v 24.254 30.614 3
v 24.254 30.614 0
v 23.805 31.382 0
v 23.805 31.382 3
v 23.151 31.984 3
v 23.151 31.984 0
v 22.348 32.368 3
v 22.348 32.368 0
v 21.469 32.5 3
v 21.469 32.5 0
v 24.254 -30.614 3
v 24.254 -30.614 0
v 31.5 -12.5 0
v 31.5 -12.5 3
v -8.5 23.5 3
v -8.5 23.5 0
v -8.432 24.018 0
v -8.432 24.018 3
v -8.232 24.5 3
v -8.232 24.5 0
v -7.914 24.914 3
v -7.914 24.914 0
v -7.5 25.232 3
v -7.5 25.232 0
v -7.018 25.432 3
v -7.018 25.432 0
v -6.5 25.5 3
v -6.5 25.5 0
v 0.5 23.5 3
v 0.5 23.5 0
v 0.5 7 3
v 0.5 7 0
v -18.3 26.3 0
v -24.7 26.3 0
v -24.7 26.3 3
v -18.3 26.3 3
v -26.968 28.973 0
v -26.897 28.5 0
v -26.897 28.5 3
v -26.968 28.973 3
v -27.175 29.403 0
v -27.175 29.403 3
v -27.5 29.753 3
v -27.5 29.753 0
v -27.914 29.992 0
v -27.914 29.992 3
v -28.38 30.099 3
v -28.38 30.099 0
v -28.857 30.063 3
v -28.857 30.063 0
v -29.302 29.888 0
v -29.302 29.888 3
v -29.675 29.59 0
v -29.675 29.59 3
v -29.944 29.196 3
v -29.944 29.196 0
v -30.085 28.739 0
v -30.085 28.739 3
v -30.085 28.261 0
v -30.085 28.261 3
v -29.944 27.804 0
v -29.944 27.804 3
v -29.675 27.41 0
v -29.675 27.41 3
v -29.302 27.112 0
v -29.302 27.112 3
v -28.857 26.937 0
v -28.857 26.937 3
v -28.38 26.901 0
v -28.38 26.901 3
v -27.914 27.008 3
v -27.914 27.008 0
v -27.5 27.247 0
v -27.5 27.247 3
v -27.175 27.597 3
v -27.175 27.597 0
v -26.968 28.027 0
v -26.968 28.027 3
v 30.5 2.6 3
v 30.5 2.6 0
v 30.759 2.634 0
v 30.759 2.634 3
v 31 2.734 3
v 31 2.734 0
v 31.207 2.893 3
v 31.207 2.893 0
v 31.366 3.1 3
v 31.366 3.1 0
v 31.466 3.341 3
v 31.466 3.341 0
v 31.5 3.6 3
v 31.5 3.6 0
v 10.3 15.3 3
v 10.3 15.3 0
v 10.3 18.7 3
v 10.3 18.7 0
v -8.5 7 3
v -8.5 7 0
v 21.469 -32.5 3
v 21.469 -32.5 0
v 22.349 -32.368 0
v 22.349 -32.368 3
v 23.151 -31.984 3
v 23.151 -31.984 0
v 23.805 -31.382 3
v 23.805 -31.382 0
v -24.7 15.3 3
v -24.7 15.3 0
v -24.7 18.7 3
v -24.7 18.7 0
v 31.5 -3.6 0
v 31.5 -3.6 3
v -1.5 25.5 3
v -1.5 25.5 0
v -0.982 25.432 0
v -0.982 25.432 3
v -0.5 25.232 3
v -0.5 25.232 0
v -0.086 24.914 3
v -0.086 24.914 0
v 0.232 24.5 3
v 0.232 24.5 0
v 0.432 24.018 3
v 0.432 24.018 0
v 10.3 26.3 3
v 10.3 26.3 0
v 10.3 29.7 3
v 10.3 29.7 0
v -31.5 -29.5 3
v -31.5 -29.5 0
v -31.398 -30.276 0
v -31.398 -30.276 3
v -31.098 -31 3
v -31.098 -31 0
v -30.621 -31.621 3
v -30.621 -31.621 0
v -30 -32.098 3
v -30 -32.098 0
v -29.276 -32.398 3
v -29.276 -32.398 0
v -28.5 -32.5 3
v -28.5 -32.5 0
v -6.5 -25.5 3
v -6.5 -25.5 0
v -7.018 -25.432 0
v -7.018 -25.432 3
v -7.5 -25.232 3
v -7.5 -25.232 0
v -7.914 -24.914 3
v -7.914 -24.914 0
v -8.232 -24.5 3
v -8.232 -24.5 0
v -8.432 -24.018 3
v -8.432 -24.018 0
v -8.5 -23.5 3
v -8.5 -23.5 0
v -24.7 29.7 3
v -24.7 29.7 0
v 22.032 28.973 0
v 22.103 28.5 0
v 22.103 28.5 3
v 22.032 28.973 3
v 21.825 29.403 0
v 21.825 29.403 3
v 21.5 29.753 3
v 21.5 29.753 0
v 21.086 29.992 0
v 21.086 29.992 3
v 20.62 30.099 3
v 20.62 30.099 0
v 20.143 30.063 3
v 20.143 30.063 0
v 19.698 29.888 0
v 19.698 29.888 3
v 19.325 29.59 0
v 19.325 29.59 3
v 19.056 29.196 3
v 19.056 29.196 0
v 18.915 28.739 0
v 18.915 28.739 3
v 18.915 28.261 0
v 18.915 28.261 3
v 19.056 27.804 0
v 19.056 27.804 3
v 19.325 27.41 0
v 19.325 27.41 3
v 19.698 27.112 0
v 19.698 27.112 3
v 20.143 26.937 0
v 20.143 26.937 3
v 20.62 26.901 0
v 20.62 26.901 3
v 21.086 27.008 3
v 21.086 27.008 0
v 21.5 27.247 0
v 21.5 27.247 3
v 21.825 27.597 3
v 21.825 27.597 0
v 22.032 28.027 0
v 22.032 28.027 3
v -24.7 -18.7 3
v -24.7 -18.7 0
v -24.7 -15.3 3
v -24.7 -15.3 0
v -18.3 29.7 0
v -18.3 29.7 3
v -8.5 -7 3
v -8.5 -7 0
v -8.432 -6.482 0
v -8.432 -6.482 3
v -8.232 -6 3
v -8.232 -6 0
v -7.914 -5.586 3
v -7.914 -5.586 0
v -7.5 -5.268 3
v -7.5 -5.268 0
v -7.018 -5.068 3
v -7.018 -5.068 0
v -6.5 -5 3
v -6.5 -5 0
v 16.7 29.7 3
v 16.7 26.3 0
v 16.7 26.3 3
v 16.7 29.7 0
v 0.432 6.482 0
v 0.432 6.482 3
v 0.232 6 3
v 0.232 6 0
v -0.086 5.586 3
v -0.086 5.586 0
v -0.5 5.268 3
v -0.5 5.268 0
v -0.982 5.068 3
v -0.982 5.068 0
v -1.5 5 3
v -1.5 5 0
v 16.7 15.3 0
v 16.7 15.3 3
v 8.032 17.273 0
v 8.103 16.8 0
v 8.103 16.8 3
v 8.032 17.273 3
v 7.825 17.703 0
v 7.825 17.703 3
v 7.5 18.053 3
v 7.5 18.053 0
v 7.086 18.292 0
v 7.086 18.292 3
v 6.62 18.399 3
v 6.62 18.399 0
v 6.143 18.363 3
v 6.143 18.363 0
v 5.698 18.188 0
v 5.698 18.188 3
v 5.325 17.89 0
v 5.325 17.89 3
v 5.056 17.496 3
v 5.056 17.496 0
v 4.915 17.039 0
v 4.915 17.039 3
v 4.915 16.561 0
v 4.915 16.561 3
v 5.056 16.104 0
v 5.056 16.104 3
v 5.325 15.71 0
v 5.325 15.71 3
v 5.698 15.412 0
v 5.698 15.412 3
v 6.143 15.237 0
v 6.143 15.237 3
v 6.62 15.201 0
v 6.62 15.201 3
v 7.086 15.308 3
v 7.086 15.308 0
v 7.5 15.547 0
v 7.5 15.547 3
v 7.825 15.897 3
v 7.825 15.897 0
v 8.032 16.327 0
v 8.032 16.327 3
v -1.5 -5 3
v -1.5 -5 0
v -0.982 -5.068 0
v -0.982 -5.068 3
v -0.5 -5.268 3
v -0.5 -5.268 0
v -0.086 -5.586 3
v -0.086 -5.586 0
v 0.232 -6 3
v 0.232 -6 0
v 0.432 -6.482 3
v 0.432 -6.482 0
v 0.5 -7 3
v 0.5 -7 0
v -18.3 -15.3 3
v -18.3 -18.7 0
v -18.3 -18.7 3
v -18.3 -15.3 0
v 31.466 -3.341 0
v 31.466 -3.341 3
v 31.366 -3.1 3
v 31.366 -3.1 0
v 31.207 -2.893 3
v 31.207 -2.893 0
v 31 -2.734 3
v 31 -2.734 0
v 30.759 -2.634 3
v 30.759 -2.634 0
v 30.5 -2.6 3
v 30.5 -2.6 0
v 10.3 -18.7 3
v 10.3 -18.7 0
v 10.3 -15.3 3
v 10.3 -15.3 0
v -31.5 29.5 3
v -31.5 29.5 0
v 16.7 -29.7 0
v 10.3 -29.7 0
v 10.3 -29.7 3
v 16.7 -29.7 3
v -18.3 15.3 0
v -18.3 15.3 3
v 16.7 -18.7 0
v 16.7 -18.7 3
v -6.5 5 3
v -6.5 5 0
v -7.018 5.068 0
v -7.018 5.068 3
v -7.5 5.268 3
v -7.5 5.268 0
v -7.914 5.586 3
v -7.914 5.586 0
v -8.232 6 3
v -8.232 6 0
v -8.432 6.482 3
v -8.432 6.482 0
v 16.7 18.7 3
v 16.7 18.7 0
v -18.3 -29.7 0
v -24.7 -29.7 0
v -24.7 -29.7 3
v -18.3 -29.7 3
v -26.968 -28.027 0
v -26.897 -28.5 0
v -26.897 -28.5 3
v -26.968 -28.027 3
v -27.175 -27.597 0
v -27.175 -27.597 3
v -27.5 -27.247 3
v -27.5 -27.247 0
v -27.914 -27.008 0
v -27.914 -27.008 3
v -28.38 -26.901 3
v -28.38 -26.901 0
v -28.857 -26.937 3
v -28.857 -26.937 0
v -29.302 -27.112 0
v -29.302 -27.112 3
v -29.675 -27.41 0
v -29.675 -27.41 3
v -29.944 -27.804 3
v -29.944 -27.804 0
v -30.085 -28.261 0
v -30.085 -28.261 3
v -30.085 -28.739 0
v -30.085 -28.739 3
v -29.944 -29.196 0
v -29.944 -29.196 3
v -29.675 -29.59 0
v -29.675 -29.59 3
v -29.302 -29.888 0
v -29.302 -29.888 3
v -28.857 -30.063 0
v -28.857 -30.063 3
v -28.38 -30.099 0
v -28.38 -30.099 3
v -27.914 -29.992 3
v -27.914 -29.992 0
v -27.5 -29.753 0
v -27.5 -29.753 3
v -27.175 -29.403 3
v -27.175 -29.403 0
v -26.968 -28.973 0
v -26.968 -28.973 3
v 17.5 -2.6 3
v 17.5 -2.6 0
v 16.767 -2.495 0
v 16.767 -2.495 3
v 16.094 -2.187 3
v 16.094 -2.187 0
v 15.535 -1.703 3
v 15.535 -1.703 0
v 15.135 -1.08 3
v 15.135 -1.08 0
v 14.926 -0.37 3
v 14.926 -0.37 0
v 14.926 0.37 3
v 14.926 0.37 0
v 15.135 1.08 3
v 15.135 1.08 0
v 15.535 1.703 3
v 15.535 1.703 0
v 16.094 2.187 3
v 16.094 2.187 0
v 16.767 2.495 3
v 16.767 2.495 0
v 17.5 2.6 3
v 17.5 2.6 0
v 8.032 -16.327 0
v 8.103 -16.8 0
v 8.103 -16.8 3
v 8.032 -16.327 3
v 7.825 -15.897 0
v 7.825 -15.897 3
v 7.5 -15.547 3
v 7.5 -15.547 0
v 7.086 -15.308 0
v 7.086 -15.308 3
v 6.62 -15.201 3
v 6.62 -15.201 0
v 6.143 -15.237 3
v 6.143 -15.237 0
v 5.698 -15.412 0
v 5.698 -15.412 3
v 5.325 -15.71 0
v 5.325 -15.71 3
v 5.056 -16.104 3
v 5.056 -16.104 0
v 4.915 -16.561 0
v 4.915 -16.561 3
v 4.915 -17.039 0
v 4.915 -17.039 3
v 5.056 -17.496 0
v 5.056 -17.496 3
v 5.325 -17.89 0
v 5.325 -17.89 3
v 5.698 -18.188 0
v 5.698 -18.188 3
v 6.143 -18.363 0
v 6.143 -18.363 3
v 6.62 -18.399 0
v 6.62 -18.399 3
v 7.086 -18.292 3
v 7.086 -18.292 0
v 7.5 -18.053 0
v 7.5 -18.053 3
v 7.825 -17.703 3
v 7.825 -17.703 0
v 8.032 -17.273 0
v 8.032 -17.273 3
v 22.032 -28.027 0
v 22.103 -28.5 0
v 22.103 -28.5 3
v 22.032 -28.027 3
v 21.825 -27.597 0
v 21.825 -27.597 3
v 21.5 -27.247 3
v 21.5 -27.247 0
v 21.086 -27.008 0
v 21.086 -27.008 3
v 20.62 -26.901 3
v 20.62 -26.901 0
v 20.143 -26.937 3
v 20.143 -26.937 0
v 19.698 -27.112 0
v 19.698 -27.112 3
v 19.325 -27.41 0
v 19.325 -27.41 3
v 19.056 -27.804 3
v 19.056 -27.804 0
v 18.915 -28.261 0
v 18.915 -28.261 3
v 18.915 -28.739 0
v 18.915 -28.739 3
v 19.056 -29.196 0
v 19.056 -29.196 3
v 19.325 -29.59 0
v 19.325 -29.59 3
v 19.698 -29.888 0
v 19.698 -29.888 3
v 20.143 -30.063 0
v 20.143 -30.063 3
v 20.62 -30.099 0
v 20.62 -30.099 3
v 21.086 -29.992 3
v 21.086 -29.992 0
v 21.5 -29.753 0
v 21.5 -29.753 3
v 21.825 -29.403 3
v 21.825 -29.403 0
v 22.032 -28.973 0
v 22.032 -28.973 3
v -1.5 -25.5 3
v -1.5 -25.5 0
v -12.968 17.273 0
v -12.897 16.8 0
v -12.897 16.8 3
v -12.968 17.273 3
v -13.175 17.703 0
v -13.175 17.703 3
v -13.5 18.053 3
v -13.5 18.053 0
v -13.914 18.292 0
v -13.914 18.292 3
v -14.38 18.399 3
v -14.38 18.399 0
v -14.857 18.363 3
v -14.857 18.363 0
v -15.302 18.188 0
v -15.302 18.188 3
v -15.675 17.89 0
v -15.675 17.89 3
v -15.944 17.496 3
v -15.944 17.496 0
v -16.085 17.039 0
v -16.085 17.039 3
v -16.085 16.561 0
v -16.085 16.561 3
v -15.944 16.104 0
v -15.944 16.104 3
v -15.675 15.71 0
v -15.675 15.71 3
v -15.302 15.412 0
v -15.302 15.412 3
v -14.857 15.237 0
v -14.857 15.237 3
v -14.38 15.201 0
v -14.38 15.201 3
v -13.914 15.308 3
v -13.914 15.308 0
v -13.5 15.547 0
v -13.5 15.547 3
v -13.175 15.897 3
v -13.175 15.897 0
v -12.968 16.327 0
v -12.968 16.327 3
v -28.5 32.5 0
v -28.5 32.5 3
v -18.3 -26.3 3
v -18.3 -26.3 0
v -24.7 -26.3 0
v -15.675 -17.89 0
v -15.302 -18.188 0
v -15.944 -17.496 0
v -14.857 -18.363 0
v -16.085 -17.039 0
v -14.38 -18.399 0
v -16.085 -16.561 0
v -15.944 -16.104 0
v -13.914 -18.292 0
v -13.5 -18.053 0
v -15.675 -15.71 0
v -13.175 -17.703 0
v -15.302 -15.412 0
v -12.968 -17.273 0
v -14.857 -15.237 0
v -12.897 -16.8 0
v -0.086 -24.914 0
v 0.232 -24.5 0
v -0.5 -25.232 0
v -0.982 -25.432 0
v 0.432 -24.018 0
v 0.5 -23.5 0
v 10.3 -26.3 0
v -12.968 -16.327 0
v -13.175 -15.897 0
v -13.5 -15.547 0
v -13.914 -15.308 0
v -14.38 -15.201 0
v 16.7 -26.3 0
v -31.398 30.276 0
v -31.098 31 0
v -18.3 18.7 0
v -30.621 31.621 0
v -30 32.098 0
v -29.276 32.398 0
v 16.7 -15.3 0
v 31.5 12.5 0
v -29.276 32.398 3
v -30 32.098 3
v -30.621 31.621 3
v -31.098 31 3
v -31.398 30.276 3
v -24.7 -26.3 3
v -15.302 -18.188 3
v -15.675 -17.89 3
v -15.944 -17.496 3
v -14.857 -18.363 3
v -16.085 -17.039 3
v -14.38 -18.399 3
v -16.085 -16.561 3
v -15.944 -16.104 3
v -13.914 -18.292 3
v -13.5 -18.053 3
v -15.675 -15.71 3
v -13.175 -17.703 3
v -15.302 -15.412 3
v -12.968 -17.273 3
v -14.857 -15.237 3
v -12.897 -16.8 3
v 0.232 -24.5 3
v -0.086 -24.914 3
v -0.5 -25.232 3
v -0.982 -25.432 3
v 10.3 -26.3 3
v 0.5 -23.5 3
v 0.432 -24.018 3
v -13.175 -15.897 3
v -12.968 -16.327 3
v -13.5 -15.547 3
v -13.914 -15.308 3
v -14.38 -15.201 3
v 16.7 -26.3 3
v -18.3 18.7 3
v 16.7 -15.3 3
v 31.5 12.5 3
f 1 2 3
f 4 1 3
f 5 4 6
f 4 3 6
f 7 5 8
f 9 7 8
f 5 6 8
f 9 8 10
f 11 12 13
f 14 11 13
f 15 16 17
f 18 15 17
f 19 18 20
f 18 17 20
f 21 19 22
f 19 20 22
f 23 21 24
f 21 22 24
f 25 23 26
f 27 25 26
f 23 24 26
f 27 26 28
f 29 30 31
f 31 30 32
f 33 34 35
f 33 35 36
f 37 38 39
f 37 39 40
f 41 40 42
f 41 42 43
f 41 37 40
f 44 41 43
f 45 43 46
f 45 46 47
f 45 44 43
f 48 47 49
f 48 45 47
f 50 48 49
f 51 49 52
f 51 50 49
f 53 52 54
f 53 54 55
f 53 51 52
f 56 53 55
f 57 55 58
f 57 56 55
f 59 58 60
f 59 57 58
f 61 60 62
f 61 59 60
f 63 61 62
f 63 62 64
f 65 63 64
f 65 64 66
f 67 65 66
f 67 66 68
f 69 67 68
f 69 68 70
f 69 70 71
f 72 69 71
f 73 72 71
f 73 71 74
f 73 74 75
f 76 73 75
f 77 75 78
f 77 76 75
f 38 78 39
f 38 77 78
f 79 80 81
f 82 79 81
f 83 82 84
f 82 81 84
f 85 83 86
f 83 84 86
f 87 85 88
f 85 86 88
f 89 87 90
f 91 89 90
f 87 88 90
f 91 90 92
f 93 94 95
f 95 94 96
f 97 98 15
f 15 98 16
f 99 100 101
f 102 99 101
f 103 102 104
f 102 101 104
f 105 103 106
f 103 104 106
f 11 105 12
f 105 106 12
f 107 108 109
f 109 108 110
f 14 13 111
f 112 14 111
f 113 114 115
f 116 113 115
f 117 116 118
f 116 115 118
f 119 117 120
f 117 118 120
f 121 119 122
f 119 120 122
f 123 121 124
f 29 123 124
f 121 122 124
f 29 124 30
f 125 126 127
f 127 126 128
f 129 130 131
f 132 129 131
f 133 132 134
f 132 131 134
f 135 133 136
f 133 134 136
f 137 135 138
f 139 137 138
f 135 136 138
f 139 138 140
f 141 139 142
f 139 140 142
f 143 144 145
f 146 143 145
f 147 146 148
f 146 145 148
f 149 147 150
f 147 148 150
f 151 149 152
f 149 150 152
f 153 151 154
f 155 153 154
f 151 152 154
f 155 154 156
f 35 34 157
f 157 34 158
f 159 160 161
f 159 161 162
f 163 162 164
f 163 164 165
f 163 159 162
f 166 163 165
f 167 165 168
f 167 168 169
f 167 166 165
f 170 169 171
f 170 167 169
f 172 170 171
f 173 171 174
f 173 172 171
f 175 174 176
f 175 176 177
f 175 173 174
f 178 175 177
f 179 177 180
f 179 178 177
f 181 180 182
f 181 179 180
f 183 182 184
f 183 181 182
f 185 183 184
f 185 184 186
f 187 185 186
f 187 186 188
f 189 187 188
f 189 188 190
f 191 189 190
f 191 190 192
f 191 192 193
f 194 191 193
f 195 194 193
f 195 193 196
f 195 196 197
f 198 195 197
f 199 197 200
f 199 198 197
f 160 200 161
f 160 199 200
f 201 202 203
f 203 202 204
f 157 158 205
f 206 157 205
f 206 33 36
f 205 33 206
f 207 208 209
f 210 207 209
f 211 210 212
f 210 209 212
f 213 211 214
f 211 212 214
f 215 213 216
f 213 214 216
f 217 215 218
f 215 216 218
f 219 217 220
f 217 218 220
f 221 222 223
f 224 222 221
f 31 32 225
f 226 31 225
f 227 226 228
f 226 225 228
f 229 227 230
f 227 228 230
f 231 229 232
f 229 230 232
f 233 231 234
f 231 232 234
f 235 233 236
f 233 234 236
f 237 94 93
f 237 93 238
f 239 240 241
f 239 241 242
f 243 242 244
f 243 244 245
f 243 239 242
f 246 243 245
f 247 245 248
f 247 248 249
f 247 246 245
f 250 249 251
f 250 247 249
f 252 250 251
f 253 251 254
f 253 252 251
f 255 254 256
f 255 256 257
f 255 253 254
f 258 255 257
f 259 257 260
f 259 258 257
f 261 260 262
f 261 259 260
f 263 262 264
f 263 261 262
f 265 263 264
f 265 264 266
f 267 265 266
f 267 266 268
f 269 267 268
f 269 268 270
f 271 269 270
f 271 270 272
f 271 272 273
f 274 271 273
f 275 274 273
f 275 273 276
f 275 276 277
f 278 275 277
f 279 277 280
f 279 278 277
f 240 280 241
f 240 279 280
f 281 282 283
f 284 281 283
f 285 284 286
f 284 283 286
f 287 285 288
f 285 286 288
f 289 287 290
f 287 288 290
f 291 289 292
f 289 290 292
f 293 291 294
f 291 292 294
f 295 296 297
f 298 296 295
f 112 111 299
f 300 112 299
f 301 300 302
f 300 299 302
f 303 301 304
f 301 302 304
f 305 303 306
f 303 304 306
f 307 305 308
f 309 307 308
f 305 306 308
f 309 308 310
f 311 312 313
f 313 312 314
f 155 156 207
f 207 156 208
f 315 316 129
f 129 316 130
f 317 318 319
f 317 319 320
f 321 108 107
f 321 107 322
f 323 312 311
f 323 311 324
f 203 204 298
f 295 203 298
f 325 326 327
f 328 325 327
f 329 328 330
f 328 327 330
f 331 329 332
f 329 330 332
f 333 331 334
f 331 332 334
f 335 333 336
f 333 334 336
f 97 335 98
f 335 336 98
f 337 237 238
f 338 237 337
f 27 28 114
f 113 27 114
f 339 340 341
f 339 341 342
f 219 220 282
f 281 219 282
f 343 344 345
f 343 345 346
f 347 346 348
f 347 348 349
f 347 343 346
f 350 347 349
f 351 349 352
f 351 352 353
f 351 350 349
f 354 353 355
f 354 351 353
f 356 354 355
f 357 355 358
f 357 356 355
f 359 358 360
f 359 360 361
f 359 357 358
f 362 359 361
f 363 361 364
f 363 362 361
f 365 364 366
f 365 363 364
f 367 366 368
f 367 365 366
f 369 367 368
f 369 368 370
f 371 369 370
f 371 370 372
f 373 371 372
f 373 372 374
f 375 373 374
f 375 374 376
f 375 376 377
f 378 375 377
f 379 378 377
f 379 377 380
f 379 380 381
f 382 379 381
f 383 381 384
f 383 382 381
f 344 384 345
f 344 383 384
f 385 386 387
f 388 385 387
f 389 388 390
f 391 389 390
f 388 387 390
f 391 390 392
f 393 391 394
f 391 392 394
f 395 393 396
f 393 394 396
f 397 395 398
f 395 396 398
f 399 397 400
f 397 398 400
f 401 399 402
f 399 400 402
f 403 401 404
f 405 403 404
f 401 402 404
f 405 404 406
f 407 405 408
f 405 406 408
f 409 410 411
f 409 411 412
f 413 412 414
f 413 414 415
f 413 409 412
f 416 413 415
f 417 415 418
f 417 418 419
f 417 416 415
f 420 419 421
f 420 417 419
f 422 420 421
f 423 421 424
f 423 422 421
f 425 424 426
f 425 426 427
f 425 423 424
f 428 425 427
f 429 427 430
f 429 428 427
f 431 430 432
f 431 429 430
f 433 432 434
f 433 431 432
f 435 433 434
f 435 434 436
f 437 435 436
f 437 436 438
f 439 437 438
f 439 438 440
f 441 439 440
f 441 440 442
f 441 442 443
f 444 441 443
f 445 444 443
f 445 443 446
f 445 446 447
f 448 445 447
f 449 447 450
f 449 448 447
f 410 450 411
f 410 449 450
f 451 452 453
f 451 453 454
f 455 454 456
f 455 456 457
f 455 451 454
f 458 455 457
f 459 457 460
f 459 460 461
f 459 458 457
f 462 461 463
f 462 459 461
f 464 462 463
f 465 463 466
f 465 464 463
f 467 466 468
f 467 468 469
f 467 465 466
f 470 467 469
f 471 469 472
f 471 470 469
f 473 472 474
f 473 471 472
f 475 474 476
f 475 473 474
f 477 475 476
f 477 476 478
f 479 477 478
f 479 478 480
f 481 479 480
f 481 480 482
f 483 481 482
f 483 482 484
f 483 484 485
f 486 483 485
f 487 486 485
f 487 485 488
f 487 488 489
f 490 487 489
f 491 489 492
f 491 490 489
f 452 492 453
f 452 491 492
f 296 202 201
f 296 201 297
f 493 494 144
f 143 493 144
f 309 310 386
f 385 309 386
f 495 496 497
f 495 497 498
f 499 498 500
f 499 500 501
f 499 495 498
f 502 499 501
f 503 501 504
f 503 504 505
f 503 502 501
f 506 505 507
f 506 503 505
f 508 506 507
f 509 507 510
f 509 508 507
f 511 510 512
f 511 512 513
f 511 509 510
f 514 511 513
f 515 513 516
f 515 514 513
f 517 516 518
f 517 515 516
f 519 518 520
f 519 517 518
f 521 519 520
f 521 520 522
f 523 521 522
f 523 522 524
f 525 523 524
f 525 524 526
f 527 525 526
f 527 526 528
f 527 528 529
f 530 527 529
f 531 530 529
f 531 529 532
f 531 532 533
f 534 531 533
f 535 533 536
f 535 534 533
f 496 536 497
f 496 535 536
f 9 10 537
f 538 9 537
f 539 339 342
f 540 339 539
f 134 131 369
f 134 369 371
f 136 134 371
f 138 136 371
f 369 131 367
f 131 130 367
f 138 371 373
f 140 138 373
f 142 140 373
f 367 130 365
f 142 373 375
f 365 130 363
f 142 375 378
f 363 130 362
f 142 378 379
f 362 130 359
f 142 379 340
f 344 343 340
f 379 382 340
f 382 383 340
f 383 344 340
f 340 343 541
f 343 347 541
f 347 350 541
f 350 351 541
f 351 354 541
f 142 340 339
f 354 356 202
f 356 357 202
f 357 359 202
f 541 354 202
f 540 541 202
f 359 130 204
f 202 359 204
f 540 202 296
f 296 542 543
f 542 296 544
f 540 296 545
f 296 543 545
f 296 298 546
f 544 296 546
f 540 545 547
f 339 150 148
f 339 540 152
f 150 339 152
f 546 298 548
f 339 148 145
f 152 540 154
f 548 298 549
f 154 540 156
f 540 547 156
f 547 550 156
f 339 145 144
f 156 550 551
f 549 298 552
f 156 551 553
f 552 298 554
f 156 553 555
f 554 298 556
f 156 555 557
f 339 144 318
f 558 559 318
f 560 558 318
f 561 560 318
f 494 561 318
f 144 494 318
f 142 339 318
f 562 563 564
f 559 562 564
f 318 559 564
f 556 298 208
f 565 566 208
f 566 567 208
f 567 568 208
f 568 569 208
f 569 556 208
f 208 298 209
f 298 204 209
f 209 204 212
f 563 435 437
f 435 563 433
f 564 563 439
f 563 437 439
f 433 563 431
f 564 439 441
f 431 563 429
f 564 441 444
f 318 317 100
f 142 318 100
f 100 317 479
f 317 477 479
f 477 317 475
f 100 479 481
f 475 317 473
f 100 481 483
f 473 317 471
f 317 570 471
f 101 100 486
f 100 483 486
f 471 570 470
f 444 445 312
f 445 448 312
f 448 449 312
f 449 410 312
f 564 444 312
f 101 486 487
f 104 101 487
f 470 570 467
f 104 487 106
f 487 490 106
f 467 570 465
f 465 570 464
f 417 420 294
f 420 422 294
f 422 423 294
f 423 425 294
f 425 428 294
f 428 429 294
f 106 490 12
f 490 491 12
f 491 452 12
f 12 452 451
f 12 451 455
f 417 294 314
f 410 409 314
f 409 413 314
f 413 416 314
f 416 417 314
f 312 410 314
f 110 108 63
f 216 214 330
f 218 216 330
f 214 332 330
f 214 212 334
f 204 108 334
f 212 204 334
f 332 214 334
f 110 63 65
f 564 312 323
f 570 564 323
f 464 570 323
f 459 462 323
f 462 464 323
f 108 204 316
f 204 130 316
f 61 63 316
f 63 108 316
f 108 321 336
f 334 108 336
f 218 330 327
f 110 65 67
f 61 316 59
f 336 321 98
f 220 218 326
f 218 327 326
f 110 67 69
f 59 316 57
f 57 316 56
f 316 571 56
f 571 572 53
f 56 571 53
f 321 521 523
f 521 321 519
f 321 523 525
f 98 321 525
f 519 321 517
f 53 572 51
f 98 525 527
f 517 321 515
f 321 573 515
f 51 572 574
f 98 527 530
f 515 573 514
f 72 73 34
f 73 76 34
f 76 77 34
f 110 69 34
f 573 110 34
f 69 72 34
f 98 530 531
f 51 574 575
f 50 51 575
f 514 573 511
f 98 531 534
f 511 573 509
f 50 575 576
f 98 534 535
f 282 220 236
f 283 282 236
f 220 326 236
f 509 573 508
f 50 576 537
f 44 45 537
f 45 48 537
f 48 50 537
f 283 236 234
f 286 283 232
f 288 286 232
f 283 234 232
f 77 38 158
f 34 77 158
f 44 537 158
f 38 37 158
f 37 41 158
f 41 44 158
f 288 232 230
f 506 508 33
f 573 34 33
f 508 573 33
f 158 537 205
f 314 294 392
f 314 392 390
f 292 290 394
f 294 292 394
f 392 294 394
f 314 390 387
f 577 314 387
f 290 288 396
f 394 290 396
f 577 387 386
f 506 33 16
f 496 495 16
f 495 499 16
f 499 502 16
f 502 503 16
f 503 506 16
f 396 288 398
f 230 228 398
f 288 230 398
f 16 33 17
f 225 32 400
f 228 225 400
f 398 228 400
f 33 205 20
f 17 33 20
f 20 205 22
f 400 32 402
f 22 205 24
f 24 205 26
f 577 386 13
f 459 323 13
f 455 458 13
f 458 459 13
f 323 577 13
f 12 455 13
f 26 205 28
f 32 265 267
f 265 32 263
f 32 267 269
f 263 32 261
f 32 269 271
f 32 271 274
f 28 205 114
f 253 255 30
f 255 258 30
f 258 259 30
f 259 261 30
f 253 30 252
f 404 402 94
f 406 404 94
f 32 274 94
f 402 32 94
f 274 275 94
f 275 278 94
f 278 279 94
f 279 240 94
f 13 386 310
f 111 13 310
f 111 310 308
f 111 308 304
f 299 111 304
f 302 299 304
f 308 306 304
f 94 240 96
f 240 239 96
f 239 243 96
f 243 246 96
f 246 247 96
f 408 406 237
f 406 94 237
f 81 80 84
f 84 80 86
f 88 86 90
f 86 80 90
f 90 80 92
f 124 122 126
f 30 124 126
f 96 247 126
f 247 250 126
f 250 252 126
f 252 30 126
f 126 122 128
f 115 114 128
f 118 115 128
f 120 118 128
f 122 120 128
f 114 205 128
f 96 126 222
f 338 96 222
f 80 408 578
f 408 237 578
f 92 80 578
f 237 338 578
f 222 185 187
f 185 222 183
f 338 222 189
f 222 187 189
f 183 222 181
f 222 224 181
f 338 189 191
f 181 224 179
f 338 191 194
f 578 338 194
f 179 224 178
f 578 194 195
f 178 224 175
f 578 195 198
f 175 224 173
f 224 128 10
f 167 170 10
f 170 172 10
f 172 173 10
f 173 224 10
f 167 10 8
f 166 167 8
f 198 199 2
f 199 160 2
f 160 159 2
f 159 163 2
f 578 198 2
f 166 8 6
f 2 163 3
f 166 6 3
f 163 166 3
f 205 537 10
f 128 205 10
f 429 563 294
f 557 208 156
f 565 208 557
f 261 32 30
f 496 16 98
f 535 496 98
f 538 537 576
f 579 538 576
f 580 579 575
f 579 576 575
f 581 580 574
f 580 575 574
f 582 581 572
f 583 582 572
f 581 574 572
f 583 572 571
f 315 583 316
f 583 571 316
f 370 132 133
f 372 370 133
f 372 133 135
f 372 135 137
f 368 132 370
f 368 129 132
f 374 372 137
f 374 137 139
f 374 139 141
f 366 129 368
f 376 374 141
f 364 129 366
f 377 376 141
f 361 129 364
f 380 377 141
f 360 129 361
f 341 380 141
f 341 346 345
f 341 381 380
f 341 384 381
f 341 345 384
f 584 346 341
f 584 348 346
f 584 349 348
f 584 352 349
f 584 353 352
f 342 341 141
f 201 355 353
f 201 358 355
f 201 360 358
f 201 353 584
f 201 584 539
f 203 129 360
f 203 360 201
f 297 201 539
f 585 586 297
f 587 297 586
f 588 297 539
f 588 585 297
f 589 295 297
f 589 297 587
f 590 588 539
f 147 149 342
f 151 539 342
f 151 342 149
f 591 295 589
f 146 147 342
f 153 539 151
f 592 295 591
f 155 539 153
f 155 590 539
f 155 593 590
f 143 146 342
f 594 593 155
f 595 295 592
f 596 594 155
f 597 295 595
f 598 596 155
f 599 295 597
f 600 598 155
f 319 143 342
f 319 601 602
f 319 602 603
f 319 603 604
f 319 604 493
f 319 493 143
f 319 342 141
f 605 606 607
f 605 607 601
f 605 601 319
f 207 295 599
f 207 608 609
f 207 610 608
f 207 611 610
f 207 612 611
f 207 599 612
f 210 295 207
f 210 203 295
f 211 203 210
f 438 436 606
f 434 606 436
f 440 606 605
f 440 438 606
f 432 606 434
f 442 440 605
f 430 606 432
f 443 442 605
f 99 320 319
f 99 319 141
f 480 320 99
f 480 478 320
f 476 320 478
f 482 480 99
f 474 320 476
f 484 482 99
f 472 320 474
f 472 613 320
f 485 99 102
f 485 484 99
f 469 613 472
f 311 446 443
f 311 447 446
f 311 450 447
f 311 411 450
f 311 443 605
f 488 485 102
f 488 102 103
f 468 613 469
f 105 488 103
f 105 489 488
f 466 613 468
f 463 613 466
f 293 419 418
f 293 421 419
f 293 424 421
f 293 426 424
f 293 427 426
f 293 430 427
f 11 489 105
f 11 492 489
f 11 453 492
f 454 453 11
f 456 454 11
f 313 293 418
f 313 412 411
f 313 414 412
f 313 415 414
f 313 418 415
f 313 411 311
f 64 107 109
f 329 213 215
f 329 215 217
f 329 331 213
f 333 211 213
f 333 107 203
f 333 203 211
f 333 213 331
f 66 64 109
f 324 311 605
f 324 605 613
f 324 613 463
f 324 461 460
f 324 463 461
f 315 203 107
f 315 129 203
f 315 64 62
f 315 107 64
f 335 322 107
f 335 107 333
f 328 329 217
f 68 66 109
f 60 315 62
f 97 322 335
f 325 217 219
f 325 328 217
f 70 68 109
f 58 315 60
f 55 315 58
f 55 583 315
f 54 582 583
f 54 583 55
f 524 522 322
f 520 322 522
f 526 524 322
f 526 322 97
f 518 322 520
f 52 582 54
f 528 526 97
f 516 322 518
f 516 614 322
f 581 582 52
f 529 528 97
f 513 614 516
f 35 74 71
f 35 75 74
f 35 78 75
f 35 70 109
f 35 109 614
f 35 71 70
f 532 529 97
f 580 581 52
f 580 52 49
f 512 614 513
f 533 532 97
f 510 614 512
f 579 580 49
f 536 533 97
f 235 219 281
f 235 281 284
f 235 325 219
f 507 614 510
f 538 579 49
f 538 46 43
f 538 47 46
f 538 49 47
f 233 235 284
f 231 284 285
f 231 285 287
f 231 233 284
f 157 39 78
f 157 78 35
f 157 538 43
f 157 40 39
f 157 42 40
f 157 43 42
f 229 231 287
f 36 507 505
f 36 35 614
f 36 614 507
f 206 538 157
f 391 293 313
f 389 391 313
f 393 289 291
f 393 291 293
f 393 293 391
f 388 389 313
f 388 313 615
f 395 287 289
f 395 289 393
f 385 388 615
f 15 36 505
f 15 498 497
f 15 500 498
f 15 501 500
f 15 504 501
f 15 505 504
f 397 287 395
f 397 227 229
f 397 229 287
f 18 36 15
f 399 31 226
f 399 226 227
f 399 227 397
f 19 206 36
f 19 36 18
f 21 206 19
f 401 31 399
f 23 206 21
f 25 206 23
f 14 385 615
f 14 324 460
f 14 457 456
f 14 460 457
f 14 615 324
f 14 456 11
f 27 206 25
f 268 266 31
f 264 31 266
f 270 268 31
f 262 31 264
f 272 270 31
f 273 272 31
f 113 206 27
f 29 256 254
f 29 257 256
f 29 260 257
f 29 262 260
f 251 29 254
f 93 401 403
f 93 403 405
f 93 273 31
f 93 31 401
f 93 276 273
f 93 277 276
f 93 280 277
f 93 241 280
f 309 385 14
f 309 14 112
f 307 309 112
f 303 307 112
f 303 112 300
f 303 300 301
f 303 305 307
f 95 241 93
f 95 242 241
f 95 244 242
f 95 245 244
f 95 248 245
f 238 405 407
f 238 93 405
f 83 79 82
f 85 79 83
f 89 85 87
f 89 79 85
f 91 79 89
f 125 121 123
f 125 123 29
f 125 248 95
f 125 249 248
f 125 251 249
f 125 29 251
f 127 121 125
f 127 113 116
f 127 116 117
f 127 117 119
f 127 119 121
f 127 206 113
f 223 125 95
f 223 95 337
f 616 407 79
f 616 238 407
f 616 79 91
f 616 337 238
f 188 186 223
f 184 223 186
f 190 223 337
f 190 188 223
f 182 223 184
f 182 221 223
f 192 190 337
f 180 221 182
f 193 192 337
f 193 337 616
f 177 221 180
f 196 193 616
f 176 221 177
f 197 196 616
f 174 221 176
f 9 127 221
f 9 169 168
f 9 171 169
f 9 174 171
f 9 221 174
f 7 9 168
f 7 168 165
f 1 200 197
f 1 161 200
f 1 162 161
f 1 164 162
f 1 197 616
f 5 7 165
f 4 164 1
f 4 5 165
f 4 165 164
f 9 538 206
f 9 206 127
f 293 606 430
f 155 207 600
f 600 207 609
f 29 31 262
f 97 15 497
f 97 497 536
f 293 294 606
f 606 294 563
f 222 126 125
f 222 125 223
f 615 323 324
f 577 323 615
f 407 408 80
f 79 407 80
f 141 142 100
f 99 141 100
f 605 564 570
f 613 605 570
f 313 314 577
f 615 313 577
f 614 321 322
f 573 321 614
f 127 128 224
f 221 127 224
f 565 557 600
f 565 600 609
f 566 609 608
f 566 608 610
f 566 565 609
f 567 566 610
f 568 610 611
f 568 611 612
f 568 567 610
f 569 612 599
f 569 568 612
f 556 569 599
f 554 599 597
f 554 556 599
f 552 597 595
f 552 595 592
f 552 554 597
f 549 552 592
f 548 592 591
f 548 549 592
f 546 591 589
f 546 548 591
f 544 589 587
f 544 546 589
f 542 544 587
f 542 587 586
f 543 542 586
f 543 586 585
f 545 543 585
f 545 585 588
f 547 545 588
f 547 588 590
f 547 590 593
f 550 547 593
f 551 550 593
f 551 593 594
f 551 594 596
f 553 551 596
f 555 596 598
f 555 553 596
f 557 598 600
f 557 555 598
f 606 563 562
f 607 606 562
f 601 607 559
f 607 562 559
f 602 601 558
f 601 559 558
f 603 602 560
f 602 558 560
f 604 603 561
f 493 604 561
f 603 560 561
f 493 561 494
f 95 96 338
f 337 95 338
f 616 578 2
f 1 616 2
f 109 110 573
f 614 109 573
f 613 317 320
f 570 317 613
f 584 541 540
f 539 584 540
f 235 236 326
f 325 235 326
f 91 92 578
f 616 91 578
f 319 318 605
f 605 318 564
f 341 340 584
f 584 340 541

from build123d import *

# Parameters (mm, degrees)
F0_R     = 1.60312
F0_W     = 6.4
F0_H     = 3.4
F1_DEPTH = 3


# Not quite as in the source:
# - ends of sketch curves that miss each other by under 0.0002 mm in the source are joined


with BuildPart() as f1:
    # F0 (on Top) → F1 (new body)
    with BuildSketch(Plane.XY):
        with BuildLine():
            ThreePointArc((17.5, -2.6), (14.9, 0), (17.5, 2.6))
            Line((17.5, 2.6), (30.5, 2.6))
            ThreePointArc((30.5, 2.6), (31.2071067812, 2.8928932188), (31.5, 3.6))
            Line((31.5, 3.6), (31.5, 12.5))
            Line((31.5, 12.5), (24.2543, 30.6142))
            ThreePointArc((24.2543, 30.6142), (23.1507874279, 31.9842016914), (21.468901, 32.5))
            Line((21.468901, 32.5), (-28.5, 32.5))
            ThreePointArc((-28.5, 32.5), (-30.6213203436, 31.6213203436), (-31.5, 29.5))
            Line((-31.5, 29.5), (-31.5, -29.5))
            ThreePointArc((-31.5, -29.5), (-30.6213203436, -31.6213203436), (-28.5, -32.5))
            Line((-28.5, -32.5), (21.468901, -32.5))
            ThreePointArc((21.468901, -32.5), (23.1507874279, -31.9842016914), (24.2543310727, -30.6141720291))
            Line((24.2543310727, -30.6141720291), (31.5, -12.5))
            Line((31.5, -12.5), (31.5, -3.6))
            ThreePointArc((31.5, -3.6), (31.2071067812, -2.8928932188), (30.5, -2.6))
            Line((30.5, -2.6), (17.5, -2.6))
        make_face()
        with Locations((-28.5, -28.5)):
            Circle(F0_R, mode=Mode.SUBTRACT)
        with Locations((-21.5, -28)):
            Rectangle(F0_W, F0_H, mode=Mode.SUBTRACT)
        with Locations((-21.5, -17)):
            Rectangle(F0_W, F0_H, mode=Mode.SUBTRACT)
        with Locations((-14.5, -16.8)):
            Circle(F0_R, mode=Mode.SUBTRACT)
        with BuildLine():
            ThreePointArc((0.5, -23.5), (-0.0857864376, -24.9142135624), (-1.5, -25.5))
            Line((-1.5, -25.5), (-6.5, -25.5))
            ThreePointArc((-6.5, -25.5), (-7.9142135624, -24.9142135624), (-8.5, -23.5))
            Line((-8.5, -23.5), (-8.5, -7))
            ThreePointArc((-8.5, -7), (-7.9142135624, -5.5857864376), (-6.5, -5))
            Line((-6.5, -5), (-1.5, -5))
            ThreePointArc((-1.5, -5), (-0.0857864376, -5.5857864376), (0.5, -7))
            Line((0.5, -7), (0.5, -23.5))
        make_face(mode=Mode.SUBTRACT)
        with Locations((13.5, -28)):
            Rectangle(F0_W, F0_H, mode=Mode.SUBTRACT)
        with Locations((6.5, -16.8)):
            Circle(F0_R, mode=Mode.SUBTRACT)
        with Locations((13.5, -17)):
            Rectangle(F0_W, F0_H, mode=Mode.SUBTRACT)
        with Locations((20.5, -28.5)):
            Circle(F0_R, mode=Mode.SUBTRACT)
        with BuildLine():
            ThreePointArc((-1.5, 25.5), (-0.0857864376, 24.9142135624), (0.5, 23.5))
            Line((0.5, 23.5), (0.5, 7))
            ThreePointArc((0.5, 7), (-0.0857864376, 5.5857864376), (-1.5, 5))
            Line((-1.5, 5), (-6.5, 5))
            ThreePointArc((-6.5, 5), (-7.9142135624, 5.5857864376), (-8.5, 7))
            Line((-8.5, 7), (-8.5, 23.5))
            ThreePointArc((-8.5, 23.5), (-7.9142135624, 24.9142135624), (-6.5, 25.5))
            Line((-6.5, 25.5), (-1.5, 25.5))
        make_face(mode=Mode.SUBTRACT)
        with Locations((-21.5, 17)):
            Rectangle(F0_W, F0_H, mode=Mode.SUBTRACT)
        with Locations((-28.5, 28.5)):
            Circle(F0_R, mode=Mode.SUBTRACT)
        with Locations((-21.5, 28)):
            Rectangle(F0_W, F0_H, mode=Mode.SUBTRACT)
        with Locations((-14.5, 16.8)):
            Circle(F0_R, mode=Mode.SUBTRACT)
        with Locations((6.5, 16.8)):
            Circle(F0_R, mode=Mode.SUBTRACT)
        with Locations((13.5, 17)):
            Rectangle(F0_W, F0_H, mode=Mode.SUBTRACT)
        with Locations((13.5, 28)):
            Rectangle(F0_W, F0_H, mode=Mode.SUBTRACT)
        with Locations((20.5, 28.5)):
            Circle(F0_R, mode=Mode.SUBTRACT)
    extrude(amount=F1_DEPTH)


solid = f1.part
